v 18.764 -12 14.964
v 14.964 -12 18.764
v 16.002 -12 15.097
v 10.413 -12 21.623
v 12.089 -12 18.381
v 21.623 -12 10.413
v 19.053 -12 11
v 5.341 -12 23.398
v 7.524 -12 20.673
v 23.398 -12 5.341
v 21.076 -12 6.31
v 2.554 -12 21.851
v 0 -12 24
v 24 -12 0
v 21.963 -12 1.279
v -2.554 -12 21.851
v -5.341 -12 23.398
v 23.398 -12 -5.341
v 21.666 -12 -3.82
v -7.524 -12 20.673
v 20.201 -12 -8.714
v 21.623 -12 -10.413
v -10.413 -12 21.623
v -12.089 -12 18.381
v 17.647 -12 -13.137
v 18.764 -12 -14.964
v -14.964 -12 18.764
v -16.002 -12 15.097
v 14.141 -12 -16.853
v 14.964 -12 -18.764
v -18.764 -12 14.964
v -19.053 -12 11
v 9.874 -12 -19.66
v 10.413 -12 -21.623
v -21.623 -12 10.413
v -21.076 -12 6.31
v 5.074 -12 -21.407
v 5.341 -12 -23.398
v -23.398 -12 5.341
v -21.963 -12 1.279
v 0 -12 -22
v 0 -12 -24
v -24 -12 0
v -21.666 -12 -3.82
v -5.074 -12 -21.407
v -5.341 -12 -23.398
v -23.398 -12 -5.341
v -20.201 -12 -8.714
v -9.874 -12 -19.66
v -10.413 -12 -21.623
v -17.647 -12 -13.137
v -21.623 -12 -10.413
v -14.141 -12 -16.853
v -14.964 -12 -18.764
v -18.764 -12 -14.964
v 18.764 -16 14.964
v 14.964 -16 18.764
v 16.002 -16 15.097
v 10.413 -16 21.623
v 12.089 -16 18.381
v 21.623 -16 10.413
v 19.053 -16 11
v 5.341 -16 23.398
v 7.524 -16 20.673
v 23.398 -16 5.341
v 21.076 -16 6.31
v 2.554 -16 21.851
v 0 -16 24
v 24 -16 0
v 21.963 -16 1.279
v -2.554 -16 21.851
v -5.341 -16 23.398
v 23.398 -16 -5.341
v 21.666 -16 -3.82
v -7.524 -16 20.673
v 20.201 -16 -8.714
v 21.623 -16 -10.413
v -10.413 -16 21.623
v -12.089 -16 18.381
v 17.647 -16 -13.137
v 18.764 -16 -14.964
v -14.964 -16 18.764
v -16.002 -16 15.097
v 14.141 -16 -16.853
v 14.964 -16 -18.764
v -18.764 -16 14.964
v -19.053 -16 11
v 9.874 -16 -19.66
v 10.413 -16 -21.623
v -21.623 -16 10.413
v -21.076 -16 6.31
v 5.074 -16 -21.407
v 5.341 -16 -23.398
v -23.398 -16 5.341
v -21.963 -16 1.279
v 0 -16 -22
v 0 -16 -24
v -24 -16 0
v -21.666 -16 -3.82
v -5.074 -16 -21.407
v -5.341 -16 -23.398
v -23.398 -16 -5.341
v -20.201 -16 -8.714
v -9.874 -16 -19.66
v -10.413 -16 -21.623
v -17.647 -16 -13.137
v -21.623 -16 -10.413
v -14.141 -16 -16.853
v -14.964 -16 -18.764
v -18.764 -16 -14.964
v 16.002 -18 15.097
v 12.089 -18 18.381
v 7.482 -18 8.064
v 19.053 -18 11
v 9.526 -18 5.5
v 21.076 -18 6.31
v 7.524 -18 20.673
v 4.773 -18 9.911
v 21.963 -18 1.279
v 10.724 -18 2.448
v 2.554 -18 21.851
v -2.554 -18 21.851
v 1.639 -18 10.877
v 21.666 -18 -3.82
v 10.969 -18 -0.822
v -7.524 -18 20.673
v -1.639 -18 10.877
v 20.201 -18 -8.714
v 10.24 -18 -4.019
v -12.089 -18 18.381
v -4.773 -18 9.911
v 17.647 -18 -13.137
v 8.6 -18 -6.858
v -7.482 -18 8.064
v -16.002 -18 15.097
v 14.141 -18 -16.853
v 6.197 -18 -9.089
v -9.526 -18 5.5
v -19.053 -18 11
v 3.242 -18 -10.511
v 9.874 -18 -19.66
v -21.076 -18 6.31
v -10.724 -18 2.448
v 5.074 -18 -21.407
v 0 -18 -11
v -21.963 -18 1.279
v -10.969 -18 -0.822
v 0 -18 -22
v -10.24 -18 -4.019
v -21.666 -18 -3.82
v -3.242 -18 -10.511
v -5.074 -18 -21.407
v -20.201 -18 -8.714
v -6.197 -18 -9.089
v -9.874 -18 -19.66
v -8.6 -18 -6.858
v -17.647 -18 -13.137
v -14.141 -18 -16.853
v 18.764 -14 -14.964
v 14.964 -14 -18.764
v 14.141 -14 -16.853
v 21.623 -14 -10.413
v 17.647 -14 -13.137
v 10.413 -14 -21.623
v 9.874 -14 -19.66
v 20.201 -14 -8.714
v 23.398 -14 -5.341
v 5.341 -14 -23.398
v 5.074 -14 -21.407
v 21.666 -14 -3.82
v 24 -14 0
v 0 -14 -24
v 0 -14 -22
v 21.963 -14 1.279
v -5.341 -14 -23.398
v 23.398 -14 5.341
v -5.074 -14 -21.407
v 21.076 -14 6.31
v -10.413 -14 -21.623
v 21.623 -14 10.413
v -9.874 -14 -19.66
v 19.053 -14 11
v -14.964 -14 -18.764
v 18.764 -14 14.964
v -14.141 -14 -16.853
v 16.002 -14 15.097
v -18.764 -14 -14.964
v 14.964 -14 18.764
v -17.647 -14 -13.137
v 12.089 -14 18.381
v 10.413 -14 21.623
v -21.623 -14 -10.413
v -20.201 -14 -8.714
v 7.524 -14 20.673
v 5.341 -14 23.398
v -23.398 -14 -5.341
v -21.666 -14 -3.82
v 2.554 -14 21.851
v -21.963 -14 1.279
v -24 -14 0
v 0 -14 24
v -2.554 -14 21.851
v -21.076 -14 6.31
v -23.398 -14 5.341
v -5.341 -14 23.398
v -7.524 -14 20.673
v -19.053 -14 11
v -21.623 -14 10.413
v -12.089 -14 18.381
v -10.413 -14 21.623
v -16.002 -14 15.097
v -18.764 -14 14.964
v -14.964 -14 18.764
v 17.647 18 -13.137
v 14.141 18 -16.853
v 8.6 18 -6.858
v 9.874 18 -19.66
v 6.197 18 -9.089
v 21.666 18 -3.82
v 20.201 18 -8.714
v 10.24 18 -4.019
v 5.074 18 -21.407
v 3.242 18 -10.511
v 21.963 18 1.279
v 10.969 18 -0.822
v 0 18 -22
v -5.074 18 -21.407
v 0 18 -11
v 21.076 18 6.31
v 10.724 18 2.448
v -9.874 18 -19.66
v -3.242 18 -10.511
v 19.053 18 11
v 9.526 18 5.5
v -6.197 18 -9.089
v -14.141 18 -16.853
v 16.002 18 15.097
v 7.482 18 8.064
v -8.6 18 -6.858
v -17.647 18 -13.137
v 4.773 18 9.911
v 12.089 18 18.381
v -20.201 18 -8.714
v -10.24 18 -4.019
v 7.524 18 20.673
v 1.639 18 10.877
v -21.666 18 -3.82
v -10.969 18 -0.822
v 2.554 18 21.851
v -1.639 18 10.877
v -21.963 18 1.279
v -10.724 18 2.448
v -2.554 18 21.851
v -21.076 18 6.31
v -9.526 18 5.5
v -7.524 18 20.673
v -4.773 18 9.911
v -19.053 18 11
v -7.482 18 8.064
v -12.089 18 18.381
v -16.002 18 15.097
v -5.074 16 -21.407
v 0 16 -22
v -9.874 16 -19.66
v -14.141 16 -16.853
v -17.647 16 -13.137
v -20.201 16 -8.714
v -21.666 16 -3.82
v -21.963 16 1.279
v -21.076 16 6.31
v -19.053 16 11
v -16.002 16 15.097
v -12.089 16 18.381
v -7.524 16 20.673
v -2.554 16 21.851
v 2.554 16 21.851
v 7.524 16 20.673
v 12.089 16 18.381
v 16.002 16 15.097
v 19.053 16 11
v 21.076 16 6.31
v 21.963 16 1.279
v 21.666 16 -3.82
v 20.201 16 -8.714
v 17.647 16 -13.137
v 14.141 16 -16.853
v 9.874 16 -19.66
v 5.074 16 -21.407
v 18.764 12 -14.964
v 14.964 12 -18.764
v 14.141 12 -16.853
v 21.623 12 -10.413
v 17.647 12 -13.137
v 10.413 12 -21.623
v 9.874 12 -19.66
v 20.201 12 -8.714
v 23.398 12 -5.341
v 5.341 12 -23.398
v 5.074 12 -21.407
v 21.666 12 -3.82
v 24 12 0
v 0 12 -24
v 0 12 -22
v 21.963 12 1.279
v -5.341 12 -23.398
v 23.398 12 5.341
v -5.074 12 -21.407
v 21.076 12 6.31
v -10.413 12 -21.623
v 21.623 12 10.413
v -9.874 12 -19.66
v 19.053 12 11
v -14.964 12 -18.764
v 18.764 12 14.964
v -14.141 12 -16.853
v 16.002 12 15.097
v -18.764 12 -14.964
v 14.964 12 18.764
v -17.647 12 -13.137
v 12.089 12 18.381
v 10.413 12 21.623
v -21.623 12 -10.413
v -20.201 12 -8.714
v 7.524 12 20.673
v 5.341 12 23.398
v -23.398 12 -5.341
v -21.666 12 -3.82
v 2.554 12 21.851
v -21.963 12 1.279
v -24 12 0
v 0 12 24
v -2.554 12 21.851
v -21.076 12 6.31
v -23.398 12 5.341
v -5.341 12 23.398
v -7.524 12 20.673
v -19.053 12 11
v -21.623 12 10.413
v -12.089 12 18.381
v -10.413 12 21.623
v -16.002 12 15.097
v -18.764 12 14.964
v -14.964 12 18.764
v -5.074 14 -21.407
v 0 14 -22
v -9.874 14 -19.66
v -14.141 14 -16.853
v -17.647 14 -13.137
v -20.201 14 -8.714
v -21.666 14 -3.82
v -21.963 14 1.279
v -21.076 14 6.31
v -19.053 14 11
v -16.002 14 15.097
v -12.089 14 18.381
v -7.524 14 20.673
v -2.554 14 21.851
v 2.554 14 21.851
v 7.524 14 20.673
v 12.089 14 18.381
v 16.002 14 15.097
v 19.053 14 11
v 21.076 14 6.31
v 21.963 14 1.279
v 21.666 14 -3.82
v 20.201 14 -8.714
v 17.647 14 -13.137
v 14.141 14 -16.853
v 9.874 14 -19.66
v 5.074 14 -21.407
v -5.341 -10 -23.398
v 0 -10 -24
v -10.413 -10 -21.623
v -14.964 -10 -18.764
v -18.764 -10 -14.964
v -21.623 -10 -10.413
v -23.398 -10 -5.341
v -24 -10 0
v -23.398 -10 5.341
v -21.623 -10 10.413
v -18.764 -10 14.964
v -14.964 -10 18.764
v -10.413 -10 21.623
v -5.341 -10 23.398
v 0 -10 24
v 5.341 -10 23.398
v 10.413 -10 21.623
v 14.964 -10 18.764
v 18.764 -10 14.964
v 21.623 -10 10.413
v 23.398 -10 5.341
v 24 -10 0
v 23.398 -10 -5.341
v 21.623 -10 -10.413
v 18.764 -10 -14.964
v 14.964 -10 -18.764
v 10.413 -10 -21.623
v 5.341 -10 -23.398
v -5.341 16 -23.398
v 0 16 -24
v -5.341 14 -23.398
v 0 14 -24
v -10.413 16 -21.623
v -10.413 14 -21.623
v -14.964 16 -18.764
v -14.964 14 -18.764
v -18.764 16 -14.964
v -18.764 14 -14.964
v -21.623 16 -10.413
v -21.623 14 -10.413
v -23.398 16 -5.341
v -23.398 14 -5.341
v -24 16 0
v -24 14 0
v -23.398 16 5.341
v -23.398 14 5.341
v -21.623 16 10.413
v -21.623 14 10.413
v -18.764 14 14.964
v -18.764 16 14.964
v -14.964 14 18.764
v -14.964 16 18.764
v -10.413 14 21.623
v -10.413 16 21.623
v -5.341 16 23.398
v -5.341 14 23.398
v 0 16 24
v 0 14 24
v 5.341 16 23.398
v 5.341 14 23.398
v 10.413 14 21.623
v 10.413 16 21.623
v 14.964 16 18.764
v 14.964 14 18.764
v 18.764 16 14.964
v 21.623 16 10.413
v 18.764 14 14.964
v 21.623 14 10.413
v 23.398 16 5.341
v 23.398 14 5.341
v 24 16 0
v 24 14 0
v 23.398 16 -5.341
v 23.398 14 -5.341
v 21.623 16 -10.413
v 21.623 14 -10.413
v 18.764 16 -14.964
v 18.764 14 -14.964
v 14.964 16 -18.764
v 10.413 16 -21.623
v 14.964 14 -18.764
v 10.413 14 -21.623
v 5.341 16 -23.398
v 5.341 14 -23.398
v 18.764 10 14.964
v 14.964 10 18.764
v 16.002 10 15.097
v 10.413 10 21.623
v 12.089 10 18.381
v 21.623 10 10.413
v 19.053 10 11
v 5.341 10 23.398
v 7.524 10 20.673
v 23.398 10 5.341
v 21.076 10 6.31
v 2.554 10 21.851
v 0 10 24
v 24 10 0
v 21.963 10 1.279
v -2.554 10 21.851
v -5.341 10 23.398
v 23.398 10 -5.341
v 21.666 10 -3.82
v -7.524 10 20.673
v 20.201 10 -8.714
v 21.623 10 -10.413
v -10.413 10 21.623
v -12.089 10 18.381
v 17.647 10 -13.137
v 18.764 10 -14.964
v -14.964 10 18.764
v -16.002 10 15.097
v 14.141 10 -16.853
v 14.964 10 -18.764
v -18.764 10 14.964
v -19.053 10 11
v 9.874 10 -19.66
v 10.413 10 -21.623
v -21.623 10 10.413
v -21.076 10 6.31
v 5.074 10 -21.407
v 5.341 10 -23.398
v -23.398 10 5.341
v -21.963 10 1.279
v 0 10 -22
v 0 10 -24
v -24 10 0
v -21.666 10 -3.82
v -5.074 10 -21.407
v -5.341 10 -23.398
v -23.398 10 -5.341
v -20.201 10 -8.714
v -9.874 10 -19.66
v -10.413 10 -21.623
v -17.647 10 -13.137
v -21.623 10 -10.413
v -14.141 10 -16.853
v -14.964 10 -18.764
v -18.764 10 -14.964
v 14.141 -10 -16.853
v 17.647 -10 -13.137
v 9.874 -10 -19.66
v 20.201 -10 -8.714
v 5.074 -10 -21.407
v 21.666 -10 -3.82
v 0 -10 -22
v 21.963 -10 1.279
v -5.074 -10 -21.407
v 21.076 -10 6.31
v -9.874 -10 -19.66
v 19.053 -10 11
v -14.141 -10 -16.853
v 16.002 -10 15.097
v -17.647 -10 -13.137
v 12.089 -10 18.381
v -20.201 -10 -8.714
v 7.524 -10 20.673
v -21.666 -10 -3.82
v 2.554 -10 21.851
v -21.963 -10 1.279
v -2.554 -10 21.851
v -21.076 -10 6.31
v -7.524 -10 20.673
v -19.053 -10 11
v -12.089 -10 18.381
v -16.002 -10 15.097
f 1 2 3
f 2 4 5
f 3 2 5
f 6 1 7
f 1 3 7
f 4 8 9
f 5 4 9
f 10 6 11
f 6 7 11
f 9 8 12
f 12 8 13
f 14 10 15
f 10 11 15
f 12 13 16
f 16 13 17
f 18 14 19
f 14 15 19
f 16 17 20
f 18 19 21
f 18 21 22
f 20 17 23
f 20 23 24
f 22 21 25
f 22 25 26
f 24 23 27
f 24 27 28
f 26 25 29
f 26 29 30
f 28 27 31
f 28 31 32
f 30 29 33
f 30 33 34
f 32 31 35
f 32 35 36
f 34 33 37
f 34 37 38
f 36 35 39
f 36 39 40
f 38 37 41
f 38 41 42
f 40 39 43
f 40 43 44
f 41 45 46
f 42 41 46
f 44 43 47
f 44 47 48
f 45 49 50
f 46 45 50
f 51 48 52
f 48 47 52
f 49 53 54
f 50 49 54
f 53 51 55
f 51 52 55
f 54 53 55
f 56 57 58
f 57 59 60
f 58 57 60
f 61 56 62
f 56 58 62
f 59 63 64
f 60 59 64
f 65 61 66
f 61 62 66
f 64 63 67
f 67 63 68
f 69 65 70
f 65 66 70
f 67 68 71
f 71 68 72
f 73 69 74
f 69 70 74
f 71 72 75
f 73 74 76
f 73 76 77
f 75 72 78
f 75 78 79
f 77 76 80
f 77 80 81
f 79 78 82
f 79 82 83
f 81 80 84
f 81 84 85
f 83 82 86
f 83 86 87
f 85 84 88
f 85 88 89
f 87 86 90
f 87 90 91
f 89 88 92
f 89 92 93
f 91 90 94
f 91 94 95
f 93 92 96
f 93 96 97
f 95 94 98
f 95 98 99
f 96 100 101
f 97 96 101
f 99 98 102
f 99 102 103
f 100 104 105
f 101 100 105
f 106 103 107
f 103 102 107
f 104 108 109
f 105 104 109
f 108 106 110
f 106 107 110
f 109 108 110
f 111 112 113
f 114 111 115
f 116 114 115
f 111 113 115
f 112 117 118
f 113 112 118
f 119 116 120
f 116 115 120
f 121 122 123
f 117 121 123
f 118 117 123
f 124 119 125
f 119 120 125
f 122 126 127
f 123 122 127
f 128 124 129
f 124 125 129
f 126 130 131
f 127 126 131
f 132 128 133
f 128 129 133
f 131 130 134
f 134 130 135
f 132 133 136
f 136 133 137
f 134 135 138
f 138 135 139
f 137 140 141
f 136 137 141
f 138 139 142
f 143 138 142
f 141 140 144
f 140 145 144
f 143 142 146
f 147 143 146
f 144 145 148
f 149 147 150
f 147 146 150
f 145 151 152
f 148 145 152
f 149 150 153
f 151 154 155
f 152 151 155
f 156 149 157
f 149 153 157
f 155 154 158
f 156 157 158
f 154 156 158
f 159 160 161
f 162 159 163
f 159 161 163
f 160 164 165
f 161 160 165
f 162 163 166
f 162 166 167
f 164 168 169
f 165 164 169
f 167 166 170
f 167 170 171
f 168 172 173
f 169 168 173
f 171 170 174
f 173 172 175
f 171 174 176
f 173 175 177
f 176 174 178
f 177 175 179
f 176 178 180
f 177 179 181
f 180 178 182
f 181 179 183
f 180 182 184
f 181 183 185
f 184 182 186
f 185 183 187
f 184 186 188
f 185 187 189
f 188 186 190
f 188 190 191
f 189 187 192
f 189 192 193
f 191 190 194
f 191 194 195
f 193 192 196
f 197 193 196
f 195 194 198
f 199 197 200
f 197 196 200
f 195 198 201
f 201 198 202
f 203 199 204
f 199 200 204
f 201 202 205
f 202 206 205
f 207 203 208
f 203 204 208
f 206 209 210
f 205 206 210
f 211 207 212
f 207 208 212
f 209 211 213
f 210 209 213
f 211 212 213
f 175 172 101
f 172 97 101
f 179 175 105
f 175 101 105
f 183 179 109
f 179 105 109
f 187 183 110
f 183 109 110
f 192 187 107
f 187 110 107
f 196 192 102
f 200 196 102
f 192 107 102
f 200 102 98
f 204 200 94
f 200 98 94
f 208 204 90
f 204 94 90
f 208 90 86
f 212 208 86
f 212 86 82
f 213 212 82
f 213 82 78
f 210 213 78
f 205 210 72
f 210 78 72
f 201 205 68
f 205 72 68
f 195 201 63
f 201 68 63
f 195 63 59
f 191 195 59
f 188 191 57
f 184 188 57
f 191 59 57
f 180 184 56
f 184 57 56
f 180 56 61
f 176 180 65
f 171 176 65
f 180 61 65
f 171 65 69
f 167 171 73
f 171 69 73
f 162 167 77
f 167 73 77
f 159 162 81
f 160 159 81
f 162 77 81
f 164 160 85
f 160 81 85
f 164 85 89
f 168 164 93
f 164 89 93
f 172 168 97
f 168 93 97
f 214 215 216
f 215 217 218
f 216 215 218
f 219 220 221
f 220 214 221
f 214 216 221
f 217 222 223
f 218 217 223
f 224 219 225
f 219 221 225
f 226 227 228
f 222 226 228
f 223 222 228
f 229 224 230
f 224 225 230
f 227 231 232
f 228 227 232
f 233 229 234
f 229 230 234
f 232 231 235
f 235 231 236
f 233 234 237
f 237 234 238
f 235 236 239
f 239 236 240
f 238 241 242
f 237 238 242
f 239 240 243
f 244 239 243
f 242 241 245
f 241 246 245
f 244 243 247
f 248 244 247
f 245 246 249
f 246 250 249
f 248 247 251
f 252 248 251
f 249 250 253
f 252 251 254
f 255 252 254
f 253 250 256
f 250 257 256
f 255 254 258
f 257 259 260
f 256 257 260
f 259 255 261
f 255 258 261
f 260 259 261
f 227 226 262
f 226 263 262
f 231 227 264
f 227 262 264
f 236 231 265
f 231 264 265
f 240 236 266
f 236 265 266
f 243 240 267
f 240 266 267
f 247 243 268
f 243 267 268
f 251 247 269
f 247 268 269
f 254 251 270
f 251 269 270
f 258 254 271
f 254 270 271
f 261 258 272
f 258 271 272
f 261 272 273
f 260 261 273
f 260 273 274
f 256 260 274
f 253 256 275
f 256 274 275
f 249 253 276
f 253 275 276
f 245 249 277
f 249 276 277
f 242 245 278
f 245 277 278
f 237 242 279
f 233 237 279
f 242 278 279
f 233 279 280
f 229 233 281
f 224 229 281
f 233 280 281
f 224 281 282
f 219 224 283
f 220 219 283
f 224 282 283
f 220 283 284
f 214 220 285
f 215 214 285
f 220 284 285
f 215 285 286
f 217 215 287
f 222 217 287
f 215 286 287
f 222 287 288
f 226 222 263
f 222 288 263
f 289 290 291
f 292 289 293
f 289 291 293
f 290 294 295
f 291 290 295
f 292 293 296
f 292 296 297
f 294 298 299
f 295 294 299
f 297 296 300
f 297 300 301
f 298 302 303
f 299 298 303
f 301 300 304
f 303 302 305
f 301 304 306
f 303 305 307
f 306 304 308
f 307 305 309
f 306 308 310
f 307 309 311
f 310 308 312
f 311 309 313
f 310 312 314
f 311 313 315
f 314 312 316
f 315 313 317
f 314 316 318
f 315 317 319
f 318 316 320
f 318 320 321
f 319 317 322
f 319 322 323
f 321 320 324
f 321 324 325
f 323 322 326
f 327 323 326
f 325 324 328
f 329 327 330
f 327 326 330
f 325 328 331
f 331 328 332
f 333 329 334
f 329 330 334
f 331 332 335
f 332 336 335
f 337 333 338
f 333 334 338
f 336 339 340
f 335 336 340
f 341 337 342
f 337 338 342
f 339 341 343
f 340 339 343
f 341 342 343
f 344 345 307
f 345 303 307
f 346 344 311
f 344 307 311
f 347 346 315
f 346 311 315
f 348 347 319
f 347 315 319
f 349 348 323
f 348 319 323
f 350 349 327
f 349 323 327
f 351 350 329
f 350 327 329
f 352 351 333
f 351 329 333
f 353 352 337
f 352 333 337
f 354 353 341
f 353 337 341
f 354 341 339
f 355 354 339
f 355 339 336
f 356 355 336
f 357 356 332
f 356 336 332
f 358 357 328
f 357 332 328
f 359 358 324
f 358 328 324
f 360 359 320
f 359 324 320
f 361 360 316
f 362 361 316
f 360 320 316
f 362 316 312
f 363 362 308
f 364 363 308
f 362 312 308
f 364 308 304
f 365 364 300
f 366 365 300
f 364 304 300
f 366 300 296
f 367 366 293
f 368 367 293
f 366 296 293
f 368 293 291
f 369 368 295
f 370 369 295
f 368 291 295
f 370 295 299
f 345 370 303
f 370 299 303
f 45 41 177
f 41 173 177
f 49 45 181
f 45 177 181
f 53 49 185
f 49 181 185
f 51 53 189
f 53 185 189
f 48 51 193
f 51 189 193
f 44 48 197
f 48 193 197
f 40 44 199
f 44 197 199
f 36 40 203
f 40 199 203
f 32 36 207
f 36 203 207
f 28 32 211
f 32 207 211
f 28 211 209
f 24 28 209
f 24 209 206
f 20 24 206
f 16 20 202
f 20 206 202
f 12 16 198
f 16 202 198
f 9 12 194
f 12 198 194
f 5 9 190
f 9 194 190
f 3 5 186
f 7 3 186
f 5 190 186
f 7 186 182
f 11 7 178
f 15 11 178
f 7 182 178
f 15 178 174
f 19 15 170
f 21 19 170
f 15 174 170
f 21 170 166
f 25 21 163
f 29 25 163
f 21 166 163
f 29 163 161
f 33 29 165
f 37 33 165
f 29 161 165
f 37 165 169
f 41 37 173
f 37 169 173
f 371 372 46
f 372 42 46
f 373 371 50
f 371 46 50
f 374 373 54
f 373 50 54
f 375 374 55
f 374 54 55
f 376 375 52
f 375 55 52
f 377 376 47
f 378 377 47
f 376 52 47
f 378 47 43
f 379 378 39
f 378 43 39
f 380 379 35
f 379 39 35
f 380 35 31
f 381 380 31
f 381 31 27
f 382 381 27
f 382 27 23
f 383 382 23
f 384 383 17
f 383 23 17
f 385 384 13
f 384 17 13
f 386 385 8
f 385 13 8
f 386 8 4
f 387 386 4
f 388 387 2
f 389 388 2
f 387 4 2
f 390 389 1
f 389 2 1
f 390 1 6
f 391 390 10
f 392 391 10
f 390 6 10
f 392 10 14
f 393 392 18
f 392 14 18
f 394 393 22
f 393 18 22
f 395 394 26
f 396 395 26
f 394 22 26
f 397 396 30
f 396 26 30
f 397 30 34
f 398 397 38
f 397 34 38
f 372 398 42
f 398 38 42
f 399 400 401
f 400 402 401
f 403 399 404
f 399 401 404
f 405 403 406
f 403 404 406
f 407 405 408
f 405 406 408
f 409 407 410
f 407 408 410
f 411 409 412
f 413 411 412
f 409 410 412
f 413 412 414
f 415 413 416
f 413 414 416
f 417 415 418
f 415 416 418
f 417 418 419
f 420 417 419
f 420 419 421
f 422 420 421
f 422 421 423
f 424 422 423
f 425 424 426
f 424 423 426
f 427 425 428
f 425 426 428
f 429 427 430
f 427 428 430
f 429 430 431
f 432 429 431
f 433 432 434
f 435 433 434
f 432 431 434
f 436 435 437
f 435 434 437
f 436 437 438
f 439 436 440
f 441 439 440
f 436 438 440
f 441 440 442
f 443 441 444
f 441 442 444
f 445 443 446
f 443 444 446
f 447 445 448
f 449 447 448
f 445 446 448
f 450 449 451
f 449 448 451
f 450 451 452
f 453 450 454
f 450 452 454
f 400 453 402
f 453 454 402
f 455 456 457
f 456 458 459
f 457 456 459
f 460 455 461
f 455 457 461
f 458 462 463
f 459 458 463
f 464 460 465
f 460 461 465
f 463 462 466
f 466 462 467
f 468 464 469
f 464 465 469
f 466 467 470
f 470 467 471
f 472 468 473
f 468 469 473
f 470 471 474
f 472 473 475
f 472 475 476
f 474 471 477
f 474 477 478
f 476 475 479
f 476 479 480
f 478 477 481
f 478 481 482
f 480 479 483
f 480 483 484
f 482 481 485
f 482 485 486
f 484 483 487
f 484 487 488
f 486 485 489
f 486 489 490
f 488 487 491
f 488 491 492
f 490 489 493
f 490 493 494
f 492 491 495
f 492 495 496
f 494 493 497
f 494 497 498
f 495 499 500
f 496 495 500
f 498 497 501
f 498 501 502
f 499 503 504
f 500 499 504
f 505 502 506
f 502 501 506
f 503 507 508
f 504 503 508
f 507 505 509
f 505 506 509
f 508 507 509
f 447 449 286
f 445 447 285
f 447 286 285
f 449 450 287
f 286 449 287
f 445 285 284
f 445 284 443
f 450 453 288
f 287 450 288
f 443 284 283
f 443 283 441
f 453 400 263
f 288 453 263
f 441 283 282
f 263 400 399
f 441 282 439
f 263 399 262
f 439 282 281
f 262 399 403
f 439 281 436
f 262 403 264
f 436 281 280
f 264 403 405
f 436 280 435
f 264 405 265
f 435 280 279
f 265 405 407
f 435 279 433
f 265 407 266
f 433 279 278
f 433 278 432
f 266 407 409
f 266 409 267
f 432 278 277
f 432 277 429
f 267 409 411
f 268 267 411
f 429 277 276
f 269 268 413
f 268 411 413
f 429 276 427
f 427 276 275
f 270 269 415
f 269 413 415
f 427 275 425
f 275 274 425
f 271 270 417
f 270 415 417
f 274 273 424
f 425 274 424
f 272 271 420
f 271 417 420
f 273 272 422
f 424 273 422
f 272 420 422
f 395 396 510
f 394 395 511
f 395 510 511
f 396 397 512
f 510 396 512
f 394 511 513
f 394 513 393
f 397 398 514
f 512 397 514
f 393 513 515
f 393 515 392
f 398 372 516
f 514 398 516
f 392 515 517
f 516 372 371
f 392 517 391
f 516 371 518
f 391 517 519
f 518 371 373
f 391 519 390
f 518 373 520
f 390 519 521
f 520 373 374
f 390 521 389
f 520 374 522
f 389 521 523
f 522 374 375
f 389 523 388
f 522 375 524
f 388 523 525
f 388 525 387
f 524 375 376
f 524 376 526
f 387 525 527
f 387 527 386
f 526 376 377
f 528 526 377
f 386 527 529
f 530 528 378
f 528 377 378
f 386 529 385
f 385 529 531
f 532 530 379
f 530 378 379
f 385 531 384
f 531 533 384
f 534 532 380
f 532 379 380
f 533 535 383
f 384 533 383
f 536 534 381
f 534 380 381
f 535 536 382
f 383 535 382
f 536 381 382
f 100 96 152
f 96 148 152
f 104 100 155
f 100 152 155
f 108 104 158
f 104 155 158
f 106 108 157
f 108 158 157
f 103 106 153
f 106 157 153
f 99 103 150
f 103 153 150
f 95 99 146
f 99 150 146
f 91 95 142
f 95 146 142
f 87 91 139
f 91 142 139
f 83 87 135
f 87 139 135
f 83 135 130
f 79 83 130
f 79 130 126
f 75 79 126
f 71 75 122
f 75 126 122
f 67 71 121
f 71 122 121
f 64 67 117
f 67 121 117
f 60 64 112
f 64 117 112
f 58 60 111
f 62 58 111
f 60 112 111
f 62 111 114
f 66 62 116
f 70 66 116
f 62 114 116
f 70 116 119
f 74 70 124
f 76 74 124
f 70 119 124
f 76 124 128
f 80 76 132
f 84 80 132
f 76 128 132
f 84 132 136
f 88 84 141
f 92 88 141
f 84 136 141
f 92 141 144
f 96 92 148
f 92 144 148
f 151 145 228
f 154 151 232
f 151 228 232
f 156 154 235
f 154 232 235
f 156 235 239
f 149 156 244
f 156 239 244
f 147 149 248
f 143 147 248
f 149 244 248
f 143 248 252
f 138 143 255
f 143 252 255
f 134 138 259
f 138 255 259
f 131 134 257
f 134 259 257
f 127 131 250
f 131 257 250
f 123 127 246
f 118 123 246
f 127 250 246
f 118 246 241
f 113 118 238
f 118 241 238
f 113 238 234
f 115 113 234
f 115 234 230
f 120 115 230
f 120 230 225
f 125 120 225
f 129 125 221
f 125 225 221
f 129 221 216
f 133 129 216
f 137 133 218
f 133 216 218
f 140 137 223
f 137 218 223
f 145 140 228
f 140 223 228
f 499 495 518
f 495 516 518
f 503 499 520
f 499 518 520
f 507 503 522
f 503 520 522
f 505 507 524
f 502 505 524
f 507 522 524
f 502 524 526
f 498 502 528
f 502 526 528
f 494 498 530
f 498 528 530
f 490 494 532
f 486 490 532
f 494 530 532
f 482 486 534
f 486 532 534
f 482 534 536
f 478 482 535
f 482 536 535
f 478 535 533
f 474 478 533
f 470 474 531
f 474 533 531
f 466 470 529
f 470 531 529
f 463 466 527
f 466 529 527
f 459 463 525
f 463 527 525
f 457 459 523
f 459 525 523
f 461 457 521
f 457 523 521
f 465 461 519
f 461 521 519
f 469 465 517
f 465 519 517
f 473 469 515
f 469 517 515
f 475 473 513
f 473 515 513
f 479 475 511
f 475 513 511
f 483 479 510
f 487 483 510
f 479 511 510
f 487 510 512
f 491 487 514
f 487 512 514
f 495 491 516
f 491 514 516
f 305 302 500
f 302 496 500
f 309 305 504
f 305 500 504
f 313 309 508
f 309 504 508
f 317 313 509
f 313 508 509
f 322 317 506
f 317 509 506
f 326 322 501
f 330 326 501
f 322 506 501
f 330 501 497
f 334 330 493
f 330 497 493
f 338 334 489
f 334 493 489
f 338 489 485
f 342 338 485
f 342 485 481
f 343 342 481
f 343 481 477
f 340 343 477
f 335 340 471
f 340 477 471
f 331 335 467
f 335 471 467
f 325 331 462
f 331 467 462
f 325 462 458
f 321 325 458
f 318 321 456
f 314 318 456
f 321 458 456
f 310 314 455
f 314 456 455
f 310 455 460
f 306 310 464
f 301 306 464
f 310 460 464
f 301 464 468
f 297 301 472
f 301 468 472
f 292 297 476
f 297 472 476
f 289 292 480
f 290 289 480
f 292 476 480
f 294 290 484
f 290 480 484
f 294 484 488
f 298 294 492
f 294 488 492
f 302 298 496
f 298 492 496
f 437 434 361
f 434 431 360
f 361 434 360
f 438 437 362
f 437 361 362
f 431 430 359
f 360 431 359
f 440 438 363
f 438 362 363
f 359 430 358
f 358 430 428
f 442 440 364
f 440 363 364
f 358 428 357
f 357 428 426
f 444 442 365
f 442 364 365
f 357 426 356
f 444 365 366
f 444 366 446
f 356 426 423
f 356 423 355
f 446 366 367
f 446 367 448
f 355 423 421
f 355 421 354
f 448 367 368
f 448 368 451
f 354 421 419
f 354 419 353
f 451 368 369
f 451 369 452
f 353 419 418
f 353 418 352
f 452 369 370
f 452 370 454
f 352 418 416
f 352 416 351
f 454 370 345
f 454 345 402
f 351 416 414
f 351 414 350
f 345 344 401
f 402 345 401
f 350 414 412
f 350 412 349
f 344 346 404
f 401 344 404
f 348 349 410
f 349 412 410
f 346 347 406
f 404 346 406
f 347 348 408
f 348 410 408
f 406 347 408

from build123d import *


with BuildPart() as part:
    # Esquisse1 → Révolution1 (revolve)
    with BuildSketch(Plane.XY, mode=Mode.PRIVATE) as r_volution1_sk:
        Polygon((22, 12), (24, 12), (24, 10), (22, 10), (22, -10), (24, -10), (24, -12), (22, -12), (22, -14), (24, -14), (24, -16), (22, -16), (22, -18), (11, -18), (11, 18), (22, 18), (22, 16), (24, 16), (24, 14), (22, 14), align=None)
    revolve(r_volution1_sk.sketch.rotate(Axis((0, 0, 0), (0, 1, 0)), 90), axis=Axis((0, 0, 0), (0, 1, 0)))


solid = part.part
